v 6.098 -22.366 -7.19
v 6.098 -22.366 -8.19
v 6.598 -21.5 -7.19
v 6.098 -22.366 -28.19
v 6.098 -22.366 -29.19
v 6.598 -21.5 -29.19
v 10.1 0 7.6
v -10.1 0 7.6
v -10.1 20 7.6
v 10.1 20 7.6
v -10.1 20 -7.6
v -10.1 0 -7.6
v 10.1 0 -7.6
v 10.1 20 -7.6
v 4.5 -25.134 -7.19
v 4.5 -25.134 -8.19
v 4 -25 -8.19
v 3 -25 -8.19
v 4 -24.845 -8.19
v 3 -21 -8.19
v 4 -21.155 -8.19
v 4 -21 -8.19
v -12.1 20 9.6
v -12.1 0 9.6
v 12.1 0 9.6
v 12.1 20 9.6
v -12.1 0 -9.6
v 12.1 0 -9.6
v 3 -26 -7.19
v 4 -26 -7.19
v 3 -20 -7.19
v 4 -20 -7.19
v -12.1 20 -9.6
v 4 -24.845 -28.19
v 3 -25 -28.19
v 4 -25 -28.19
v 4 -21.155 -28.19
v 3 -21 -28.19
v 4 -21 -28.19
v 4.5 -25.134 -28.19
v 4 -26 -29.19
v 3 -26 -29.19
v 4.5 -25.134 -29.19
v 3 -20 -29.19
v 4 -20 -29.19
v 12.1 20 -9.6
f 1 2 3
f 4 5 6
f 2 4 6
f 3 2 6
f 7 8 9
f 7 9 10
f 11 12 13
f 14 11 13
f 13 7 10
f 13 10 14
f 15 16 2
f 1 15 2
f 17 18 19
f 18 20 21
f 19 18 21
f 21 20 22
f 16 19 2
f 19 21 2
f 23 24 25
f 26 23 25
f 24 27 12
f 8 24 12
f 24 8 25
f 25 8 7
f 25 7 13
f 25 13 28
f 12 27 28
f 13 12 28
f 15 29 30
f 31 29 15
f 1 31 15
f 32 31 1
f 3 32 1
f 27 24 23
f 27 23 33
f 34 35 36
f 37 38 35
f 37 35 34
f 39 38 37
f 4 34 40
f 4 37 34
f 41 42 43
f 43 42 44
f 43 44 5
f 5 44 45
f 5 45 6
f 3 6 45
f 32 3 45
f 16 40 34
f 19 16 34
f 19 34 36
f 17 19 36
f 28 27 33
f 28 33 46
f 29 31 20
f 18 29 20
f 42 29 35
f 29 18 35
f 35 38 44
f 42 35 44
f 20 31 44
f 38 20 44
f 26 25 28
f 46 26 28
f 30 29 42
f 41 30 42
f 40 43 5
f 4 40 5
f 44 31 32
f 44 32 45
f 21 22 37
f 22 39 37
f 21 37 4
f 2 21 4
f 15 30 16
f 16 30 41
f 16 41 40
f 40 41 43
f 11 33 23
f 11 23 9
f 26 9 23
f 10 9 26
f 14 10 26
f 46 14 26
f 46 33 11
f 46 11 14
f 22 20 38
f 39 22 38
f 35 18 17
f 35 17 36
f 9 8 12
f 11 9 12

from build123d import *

# Parameters (mm, degrees)
SZKIC1_W                      = 24.2
SZKIC1_H                      = 19.2
SZKIC1_W_2                    = 20.2
SZKIC1_H_2                    = 15.2
DODANIE_WYCI_GNI_CIE1_DEPTH   = 20
SZKIC2_W                      = 22
SZKIC2_H                      = 6
SZKIC2_W_2                    = 20
SZKIC2_H_2                    = 4
DODANIE_WYCI_GNI_CIE2_DEPTH   = 1
DODANIE_WYCI_GNI_CIE3_START   = -29.189963439
DODANIE_WYCI_GNI_CIE3_DEPTH   = 22
DODANIE_WYCI_GNI_CIE3_2_DEPTH = 1
DODANIE_WYCI_GNI_CIE3_START_2 = -8.189963439
DODANIE_WYCI_GNI_CIE3_3_DEPTH = 1


# Read off the part's stored shape, not the designer's step: Dodanie-wyciągnięcie3
with BuildPart() as part:
    # Szkic1 → Dodanie-wyciągnięcie1 (new body)
    with BuildSketch(Plane(origin=(0, 0, 0), x_dir=(1, 0, 0), z_dir=(0, 1, 0))):
        Rectangle(SZKIC1_W, SZKIC1_H)
        Rectangle(SZKIC1_W_2, SZKIC1_H_2, mode=Mode.SUBTRACT)
    extrude(amount=DODANIE_WYCI_GNI_CIE1_DEPTH)


with BuildPart() as body_2:
    # Szkic2 → Dodanie-wyciągnięcie2 (new body)
    with BuildSketch(Plane(origin=(3, 0, 0), x_dir=(0, 0, -1), z_dir=(1, 0, 0))):
        with Locations((18.189963439, -23)):
            Rectangle(SZKIC2_W, SZKIC2_H)
        with Locations((18.189963439, -23)):
            Rectangle(SZKIC2_W_2, SZKIC2_H_2, mode=Mode.SUBTRACT)
    extrude(amount=DODANIE_WYCI_GNI_CIE2_DEPTH)

    # Dodanie-wyciągnięcie3 outline → Dodanie-wyciągnięcie3 (add)
    with BuildSketch(Plane.XY.offset(DODANIE_WYCI_GNI_CIE3_START)):
        Polygon((4.5, -25.133974596), (4, -24.845299462), (4, -26), align=None)
        Polygon((4, -20), (4, -21.154700538), (6.098076211, -22.366025404), (6.598076211, -21.5), align=None)
    extrude(amount=DODANIE_WYCI_GNI_CIE3_DEPTH)

    # Dodanie-wyci_gni_cie3 2 outline → Dodanie-wyci_gni_cie3 2 (add)
    with BuildSketch(Plane.XY.offset(DODANIE_WYCI_GNI_CIE3_START)):
        Polygon((4, -21.154700538), (4, -24.845299462), (4.5, -25.133974596), (6.098076211, -22.366025404), align=None)
    extrude(amount=DODANIE_WYCI_GNI_CIE3_2_DEPTH)

    # Dodanie-wyci_gni_cie3 3 outline → Dodanie-wyci_gni_cie3 3 (add)
    with BuildSketch(Plane.XY.offset(DODANIE_WYCI_GNI_CIE3_START_2)):
        Polygon((4, -21.154700538), (4, -24.845299462), (4.5, -25.133974596), (6.098076211, -22.366025404), align=None)
    extrude(amount=DODANIE_WYCI_GNI_CIE3_3_DEPTH)


solid = Compound([part.part, body_2.part])
